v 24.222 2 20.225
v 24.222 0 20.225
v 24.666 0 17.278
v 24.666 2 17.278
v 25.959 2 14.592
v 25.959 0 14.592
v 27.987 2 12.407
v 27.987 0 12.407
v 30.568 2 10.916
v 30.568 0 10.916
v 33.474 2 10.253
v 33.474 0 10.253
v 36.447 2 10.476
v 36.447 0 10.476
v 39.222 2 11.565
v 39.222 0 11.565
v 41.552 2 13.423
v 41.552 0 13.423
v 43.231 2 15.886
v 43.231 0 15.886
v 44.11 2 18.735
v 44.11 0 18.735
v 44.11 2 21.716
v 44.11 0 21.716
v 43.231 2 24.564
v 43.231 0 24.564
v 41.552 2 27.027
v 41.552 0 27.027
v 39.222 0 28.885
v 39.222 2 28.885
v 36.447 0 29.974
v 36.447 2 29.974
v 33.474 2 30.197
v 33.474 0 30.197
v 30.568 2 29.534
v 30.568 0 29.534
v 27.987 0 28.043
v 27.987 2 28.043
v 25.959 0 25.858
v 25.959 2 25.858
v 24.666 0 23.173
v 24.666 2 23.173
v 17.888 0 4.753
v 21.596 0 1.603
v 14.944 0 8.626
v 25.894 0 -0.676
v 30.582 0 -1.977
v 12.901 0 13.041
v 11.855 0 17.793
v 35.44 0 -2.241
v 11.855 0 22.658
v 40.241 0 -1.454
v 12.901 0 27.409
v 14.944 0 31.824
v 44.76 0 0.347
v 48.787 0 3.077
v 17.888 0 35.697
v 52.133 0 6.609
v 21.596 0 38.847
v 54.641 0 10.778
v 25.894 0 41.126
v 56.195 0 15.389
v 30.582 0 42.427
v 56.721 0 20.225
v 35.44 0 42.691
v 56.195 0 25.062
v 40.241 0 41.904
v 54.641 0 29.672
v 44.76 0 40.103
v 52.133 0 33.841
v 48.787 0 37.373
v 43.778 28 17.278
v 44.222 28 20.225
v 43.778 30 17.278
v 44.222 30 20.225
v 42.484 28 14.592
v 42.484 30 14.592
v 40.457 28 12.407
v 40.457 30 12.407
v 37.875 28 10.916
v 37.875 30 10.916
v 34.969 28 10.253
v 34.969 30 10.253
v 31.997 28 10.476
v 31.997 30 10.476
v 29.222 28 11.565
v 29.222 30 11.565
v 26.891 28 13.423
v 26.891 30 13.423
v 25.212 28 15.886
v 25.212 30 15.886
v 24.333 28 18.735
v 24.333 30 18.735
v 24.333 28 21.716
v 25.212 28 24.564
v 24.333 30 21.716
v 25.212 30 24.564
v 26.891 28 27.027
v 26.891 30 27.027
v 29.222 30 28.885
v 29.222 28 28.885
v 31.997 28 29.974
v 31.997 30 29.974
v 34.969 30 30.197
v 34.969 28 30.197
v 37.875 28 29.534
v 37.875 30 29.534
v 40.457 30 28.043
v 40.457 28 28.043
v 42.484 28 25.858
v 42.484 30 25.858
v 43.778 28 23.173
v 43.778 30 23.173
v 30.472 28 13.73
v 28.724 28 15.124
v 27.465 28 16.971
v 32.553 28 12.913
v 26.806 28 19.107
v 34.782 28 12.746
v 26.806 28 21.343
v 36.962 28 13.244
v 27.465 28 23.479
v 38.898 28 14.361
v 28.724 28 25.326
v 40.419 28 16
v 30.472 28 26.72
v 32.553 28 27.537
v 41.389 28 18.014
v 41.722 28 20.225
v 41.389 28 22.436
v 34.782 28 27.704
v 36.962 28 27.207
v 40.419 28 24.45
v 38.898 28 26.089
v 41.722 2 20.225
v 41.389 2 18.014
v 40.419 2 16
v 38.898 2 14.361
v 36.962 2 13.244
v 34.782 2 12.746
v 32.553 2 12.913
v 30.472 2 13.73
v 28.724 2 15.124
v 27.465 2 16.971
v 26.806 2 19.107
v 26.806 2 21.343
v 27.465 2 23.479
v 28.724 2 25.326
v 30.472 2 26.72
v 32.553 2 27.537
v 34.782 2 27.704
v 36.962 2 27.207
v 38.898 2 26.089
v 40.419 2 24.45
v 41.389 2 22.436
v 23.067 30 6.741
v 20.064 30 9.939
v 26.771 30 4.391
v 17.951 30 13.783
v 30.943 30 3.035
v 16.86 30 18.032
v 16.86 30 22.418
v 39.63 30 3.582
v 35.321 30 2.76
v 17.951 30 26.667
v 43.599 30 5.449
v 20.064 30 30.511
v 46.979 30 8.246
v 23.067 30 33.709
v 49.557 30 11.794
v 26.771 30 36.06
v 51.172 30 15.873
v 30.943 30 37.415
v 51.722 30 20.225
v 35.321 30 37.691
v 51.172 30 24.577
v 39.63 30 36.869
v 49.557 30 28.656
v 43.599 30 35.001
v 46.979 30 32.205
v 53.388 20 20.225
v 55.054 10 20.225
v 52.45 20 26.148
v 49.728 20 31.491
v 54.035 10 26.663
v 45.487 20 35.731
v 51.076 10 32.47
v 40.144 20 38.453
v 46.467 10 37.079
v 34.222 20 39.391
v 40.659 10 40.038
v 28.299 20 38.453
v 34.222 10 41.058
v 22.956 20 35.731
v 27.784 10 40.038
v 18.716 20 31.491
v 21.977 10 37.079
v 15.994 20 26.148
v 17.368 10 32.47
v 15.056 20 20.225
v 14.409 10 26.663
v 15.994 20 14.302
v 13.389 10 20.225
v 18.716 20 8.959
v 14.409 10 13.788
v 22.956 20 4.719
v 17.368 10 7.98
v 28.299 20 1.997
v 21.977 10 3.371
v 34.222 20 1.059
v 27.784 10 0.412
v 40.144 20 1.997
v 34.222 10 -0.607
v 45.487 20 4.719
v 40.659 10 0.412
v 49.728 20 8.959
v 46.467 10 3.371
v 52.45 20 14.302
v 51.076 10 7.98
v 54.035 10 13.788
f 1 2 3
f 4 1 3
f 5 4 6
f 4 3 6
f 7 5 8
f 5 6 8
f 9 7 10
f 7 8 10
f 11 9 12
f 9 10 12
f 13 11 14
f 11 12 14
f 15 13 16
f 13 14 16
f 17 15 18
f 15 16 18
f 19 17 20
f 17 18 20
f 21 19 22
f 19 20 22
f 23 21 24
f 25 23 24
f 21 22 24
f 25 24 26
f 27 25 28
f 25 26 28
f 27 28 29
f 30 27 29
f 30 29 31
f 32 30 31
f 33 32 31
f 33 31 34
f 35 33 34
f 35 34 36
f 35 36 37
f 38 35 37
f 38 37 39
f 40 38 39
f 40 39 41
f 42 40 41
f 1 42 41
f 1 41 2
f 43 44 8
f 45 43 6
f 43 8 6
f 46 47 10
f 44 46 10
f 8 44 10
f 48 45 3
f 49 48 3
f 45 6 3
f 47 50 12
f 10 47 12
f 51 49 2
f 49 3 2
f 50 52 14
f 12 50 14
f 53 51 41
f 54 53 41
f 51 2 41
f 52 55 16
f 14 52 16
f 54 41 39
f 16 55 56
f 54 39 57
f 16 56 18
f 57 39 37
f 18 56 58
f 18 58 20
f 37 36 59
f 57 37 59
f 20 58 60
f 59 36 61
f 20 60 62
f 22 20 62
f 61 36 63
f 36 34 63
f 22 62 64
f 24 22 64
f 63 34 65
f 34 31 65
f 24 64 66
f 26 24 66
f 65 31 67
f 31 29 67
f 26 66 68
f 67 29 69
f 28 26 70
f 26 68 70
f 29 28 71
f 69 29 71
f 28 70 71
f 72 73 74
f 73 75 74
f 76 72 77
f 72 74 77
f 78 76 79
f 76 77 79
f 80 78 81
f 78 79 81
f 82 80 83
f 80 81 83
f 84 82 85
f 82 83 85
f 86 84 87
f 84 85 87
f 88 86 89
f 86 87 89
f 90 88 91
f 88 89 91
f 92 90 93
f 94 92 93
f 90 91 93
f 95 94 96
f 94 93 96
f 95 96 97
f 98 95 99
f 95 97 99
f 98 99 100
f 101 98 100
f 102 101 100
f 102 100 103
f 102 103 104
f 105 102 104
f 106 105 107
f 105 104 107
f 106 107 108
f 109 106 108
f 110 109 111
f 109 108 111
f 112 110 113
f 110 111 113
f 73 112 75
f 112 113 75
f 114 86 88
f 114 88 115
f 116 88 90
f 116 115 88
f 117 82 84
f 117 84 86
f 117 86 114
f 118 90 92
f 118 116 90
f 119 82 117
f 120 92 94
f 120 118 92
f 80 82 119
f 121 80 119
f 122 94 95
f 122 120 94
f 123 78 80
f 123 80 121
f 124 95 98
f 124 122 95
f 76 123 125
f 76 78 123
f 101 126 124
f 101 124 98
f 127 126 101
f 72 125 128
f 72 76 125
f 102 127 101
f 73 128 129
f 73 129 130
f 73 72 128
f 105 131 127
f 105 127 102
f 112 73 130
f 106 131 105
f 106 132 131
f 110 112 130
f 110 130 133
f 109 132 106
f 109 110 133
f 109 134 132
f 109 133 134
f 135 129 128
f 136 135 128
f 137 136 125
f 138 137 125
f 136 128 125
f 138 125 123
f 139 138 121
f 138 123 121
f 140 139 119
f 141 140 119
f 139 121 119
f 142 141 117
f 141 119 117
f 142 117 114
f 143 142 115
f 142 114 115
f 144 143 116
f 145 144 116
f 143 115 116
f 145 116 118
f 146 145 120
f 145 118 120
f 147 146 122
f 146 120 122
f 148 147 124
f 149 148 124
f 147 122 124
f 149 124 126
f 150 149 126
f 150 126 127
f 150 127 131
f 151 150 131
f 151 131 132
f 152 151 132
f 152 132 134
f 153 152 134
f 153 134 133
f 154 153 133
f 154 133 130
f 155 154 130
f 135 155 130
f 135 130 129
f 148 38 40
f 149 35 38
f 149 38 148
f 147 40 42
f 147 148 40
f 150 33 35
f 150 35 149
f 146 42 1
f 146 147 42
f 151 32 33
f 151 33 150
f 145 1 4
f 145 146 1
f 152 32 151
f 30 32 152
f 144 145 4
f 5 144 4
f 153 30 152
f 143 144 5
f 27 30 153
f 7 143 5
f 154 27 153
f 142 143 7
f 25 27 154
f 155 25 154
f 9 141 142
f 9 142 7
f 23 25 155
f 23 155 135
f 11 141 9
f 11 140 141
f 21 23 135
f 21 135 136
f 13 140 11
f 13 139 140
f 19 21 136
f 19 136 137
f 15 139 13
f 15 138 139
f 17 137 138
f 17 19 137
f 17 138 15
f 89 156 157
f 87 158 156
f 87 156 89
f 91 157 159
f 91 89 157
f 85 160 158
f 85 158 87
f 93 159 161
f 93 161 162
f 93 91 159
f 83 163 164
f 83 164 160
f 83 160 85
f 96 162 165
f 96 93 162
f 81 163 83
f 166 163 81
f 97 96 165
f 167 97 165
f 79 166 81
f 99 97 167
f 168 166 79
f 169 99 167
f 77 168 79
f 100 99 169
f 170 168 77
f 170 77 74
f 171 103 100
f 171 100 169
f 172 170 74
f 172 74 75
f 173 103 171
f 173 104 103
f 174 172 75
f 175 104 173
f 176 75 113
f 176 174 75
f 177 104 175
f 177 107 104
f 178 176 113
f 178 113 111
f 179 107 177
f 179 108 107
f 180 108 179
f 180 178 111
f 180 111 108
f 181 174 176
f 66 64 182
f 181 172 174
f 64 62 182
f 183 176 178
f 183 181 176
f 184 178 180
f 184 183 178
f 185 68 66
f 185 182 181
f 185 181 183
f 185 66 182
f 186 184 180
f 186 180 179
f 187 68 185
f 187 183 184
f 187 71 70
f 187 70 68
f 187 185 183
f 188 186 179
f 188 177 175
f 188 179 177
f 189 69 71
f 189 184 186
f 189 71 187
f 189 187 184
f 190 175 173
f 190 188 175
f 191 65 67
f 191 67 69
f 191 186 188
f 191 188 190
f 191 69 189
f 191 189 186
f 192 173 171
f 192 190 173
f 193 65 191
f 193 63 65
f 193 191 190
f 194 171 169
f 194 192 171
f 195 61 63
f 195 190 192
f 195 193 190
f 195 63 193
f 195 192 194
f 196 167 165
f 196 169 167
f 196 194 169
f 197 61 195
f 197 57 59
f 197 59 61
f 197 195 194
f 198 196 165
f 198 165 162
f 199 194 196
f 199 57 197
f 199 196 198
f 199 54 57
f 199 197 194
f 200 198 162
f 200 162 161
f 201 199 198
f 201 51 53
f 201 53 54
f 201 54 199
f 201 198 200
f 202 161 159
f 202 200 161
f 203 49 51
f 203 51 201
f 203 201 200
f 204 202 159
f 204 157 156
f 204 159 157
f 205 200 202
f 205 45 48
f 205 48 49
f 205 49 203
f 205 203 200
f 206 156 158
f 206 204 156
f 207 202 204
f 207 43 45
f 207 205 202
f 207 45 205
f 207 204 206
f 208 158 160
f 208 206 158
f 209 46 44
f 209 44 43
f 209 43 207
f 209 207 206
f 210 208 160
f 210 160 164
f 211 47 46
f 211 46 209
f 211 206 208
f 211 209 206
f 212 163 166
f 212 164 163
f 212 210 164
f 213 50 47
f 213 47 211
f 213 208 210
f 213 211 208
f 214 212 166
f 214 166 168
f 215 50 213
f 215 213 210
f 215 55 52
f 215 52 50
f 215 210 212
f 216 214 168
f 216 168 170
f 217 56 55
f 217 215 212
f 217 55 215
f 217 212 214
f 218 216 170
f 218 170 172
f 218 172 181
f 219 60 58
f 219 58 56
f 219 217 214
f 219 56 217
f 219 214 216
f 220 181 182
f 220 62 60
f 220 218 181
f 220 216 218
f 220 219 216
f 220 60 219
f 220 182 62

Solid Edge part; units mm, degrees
sketch "Sketch1" plane through (0, 0, 0) normal (0, -1, 0) x (1, 0, 0)
  circle A0 centre (34.2218, 20.2251) radius 7.5
  circle A1 centre (34.2218, 20.2251) radius 15
extrude "Protrusion1" add sketch "Sketch1" against normal blind 30
sketch "Sketch2" plane through (34.2218, 30, 20.2251) normal (0, 1, 0) x (1, 0, 0)
  circle A0 centre (0, 0) radius 17.5
extrude "ExtrudedProtrusion_2" add sketch "Sketch2" against normal blind 30
sketch "Sketch3" plane through (34.2218, 30, 20.2251) normal (0, 1, 0) x (1, 0, 0)
  circle A0 centre (0, 0) radius 7.5
extrude "ExtrudedCutout_1" cut sketch "Sketch3" against normal blind 30
draft "Draft_1" angle 9.46 neutral plane through (34.2218, 30, 20.2251) normal (0, 1, 0) pull direction (0, 1, 0) face at (43.9062, 5.3, 5.649) face at (38.3722, 5.3, 13.9782)
sketch "Sketch4" plane through (34.2218, 30, 20.2251) normal (0, 1, 0) x (1, 0, 0)
  circle A0 centre (0, 0) radius 7.5
extrude "ExtrudedCutout_2" cut sketch "Sketch4" against normal blind 30
sketch "Sketch5" plane through (34.2218, 30, 20.2251) normal (0, 1, 0) x (1, 0, 0)
  circle A0 centre (0, 0) radius 10
extrude "ExtrudedCutout_3" cut sketch "Sketch5" against normal blind 2
sketch "Sketch6" plane through (34.2218, 0, 20.2251) normal (0, -1, 0) x (-1, 0, 0)
  circle A0 centre (0, 0) radius 10
extrude "ExtrudedCutout_4" cut sketch "Sketch6" against normal blind 2
